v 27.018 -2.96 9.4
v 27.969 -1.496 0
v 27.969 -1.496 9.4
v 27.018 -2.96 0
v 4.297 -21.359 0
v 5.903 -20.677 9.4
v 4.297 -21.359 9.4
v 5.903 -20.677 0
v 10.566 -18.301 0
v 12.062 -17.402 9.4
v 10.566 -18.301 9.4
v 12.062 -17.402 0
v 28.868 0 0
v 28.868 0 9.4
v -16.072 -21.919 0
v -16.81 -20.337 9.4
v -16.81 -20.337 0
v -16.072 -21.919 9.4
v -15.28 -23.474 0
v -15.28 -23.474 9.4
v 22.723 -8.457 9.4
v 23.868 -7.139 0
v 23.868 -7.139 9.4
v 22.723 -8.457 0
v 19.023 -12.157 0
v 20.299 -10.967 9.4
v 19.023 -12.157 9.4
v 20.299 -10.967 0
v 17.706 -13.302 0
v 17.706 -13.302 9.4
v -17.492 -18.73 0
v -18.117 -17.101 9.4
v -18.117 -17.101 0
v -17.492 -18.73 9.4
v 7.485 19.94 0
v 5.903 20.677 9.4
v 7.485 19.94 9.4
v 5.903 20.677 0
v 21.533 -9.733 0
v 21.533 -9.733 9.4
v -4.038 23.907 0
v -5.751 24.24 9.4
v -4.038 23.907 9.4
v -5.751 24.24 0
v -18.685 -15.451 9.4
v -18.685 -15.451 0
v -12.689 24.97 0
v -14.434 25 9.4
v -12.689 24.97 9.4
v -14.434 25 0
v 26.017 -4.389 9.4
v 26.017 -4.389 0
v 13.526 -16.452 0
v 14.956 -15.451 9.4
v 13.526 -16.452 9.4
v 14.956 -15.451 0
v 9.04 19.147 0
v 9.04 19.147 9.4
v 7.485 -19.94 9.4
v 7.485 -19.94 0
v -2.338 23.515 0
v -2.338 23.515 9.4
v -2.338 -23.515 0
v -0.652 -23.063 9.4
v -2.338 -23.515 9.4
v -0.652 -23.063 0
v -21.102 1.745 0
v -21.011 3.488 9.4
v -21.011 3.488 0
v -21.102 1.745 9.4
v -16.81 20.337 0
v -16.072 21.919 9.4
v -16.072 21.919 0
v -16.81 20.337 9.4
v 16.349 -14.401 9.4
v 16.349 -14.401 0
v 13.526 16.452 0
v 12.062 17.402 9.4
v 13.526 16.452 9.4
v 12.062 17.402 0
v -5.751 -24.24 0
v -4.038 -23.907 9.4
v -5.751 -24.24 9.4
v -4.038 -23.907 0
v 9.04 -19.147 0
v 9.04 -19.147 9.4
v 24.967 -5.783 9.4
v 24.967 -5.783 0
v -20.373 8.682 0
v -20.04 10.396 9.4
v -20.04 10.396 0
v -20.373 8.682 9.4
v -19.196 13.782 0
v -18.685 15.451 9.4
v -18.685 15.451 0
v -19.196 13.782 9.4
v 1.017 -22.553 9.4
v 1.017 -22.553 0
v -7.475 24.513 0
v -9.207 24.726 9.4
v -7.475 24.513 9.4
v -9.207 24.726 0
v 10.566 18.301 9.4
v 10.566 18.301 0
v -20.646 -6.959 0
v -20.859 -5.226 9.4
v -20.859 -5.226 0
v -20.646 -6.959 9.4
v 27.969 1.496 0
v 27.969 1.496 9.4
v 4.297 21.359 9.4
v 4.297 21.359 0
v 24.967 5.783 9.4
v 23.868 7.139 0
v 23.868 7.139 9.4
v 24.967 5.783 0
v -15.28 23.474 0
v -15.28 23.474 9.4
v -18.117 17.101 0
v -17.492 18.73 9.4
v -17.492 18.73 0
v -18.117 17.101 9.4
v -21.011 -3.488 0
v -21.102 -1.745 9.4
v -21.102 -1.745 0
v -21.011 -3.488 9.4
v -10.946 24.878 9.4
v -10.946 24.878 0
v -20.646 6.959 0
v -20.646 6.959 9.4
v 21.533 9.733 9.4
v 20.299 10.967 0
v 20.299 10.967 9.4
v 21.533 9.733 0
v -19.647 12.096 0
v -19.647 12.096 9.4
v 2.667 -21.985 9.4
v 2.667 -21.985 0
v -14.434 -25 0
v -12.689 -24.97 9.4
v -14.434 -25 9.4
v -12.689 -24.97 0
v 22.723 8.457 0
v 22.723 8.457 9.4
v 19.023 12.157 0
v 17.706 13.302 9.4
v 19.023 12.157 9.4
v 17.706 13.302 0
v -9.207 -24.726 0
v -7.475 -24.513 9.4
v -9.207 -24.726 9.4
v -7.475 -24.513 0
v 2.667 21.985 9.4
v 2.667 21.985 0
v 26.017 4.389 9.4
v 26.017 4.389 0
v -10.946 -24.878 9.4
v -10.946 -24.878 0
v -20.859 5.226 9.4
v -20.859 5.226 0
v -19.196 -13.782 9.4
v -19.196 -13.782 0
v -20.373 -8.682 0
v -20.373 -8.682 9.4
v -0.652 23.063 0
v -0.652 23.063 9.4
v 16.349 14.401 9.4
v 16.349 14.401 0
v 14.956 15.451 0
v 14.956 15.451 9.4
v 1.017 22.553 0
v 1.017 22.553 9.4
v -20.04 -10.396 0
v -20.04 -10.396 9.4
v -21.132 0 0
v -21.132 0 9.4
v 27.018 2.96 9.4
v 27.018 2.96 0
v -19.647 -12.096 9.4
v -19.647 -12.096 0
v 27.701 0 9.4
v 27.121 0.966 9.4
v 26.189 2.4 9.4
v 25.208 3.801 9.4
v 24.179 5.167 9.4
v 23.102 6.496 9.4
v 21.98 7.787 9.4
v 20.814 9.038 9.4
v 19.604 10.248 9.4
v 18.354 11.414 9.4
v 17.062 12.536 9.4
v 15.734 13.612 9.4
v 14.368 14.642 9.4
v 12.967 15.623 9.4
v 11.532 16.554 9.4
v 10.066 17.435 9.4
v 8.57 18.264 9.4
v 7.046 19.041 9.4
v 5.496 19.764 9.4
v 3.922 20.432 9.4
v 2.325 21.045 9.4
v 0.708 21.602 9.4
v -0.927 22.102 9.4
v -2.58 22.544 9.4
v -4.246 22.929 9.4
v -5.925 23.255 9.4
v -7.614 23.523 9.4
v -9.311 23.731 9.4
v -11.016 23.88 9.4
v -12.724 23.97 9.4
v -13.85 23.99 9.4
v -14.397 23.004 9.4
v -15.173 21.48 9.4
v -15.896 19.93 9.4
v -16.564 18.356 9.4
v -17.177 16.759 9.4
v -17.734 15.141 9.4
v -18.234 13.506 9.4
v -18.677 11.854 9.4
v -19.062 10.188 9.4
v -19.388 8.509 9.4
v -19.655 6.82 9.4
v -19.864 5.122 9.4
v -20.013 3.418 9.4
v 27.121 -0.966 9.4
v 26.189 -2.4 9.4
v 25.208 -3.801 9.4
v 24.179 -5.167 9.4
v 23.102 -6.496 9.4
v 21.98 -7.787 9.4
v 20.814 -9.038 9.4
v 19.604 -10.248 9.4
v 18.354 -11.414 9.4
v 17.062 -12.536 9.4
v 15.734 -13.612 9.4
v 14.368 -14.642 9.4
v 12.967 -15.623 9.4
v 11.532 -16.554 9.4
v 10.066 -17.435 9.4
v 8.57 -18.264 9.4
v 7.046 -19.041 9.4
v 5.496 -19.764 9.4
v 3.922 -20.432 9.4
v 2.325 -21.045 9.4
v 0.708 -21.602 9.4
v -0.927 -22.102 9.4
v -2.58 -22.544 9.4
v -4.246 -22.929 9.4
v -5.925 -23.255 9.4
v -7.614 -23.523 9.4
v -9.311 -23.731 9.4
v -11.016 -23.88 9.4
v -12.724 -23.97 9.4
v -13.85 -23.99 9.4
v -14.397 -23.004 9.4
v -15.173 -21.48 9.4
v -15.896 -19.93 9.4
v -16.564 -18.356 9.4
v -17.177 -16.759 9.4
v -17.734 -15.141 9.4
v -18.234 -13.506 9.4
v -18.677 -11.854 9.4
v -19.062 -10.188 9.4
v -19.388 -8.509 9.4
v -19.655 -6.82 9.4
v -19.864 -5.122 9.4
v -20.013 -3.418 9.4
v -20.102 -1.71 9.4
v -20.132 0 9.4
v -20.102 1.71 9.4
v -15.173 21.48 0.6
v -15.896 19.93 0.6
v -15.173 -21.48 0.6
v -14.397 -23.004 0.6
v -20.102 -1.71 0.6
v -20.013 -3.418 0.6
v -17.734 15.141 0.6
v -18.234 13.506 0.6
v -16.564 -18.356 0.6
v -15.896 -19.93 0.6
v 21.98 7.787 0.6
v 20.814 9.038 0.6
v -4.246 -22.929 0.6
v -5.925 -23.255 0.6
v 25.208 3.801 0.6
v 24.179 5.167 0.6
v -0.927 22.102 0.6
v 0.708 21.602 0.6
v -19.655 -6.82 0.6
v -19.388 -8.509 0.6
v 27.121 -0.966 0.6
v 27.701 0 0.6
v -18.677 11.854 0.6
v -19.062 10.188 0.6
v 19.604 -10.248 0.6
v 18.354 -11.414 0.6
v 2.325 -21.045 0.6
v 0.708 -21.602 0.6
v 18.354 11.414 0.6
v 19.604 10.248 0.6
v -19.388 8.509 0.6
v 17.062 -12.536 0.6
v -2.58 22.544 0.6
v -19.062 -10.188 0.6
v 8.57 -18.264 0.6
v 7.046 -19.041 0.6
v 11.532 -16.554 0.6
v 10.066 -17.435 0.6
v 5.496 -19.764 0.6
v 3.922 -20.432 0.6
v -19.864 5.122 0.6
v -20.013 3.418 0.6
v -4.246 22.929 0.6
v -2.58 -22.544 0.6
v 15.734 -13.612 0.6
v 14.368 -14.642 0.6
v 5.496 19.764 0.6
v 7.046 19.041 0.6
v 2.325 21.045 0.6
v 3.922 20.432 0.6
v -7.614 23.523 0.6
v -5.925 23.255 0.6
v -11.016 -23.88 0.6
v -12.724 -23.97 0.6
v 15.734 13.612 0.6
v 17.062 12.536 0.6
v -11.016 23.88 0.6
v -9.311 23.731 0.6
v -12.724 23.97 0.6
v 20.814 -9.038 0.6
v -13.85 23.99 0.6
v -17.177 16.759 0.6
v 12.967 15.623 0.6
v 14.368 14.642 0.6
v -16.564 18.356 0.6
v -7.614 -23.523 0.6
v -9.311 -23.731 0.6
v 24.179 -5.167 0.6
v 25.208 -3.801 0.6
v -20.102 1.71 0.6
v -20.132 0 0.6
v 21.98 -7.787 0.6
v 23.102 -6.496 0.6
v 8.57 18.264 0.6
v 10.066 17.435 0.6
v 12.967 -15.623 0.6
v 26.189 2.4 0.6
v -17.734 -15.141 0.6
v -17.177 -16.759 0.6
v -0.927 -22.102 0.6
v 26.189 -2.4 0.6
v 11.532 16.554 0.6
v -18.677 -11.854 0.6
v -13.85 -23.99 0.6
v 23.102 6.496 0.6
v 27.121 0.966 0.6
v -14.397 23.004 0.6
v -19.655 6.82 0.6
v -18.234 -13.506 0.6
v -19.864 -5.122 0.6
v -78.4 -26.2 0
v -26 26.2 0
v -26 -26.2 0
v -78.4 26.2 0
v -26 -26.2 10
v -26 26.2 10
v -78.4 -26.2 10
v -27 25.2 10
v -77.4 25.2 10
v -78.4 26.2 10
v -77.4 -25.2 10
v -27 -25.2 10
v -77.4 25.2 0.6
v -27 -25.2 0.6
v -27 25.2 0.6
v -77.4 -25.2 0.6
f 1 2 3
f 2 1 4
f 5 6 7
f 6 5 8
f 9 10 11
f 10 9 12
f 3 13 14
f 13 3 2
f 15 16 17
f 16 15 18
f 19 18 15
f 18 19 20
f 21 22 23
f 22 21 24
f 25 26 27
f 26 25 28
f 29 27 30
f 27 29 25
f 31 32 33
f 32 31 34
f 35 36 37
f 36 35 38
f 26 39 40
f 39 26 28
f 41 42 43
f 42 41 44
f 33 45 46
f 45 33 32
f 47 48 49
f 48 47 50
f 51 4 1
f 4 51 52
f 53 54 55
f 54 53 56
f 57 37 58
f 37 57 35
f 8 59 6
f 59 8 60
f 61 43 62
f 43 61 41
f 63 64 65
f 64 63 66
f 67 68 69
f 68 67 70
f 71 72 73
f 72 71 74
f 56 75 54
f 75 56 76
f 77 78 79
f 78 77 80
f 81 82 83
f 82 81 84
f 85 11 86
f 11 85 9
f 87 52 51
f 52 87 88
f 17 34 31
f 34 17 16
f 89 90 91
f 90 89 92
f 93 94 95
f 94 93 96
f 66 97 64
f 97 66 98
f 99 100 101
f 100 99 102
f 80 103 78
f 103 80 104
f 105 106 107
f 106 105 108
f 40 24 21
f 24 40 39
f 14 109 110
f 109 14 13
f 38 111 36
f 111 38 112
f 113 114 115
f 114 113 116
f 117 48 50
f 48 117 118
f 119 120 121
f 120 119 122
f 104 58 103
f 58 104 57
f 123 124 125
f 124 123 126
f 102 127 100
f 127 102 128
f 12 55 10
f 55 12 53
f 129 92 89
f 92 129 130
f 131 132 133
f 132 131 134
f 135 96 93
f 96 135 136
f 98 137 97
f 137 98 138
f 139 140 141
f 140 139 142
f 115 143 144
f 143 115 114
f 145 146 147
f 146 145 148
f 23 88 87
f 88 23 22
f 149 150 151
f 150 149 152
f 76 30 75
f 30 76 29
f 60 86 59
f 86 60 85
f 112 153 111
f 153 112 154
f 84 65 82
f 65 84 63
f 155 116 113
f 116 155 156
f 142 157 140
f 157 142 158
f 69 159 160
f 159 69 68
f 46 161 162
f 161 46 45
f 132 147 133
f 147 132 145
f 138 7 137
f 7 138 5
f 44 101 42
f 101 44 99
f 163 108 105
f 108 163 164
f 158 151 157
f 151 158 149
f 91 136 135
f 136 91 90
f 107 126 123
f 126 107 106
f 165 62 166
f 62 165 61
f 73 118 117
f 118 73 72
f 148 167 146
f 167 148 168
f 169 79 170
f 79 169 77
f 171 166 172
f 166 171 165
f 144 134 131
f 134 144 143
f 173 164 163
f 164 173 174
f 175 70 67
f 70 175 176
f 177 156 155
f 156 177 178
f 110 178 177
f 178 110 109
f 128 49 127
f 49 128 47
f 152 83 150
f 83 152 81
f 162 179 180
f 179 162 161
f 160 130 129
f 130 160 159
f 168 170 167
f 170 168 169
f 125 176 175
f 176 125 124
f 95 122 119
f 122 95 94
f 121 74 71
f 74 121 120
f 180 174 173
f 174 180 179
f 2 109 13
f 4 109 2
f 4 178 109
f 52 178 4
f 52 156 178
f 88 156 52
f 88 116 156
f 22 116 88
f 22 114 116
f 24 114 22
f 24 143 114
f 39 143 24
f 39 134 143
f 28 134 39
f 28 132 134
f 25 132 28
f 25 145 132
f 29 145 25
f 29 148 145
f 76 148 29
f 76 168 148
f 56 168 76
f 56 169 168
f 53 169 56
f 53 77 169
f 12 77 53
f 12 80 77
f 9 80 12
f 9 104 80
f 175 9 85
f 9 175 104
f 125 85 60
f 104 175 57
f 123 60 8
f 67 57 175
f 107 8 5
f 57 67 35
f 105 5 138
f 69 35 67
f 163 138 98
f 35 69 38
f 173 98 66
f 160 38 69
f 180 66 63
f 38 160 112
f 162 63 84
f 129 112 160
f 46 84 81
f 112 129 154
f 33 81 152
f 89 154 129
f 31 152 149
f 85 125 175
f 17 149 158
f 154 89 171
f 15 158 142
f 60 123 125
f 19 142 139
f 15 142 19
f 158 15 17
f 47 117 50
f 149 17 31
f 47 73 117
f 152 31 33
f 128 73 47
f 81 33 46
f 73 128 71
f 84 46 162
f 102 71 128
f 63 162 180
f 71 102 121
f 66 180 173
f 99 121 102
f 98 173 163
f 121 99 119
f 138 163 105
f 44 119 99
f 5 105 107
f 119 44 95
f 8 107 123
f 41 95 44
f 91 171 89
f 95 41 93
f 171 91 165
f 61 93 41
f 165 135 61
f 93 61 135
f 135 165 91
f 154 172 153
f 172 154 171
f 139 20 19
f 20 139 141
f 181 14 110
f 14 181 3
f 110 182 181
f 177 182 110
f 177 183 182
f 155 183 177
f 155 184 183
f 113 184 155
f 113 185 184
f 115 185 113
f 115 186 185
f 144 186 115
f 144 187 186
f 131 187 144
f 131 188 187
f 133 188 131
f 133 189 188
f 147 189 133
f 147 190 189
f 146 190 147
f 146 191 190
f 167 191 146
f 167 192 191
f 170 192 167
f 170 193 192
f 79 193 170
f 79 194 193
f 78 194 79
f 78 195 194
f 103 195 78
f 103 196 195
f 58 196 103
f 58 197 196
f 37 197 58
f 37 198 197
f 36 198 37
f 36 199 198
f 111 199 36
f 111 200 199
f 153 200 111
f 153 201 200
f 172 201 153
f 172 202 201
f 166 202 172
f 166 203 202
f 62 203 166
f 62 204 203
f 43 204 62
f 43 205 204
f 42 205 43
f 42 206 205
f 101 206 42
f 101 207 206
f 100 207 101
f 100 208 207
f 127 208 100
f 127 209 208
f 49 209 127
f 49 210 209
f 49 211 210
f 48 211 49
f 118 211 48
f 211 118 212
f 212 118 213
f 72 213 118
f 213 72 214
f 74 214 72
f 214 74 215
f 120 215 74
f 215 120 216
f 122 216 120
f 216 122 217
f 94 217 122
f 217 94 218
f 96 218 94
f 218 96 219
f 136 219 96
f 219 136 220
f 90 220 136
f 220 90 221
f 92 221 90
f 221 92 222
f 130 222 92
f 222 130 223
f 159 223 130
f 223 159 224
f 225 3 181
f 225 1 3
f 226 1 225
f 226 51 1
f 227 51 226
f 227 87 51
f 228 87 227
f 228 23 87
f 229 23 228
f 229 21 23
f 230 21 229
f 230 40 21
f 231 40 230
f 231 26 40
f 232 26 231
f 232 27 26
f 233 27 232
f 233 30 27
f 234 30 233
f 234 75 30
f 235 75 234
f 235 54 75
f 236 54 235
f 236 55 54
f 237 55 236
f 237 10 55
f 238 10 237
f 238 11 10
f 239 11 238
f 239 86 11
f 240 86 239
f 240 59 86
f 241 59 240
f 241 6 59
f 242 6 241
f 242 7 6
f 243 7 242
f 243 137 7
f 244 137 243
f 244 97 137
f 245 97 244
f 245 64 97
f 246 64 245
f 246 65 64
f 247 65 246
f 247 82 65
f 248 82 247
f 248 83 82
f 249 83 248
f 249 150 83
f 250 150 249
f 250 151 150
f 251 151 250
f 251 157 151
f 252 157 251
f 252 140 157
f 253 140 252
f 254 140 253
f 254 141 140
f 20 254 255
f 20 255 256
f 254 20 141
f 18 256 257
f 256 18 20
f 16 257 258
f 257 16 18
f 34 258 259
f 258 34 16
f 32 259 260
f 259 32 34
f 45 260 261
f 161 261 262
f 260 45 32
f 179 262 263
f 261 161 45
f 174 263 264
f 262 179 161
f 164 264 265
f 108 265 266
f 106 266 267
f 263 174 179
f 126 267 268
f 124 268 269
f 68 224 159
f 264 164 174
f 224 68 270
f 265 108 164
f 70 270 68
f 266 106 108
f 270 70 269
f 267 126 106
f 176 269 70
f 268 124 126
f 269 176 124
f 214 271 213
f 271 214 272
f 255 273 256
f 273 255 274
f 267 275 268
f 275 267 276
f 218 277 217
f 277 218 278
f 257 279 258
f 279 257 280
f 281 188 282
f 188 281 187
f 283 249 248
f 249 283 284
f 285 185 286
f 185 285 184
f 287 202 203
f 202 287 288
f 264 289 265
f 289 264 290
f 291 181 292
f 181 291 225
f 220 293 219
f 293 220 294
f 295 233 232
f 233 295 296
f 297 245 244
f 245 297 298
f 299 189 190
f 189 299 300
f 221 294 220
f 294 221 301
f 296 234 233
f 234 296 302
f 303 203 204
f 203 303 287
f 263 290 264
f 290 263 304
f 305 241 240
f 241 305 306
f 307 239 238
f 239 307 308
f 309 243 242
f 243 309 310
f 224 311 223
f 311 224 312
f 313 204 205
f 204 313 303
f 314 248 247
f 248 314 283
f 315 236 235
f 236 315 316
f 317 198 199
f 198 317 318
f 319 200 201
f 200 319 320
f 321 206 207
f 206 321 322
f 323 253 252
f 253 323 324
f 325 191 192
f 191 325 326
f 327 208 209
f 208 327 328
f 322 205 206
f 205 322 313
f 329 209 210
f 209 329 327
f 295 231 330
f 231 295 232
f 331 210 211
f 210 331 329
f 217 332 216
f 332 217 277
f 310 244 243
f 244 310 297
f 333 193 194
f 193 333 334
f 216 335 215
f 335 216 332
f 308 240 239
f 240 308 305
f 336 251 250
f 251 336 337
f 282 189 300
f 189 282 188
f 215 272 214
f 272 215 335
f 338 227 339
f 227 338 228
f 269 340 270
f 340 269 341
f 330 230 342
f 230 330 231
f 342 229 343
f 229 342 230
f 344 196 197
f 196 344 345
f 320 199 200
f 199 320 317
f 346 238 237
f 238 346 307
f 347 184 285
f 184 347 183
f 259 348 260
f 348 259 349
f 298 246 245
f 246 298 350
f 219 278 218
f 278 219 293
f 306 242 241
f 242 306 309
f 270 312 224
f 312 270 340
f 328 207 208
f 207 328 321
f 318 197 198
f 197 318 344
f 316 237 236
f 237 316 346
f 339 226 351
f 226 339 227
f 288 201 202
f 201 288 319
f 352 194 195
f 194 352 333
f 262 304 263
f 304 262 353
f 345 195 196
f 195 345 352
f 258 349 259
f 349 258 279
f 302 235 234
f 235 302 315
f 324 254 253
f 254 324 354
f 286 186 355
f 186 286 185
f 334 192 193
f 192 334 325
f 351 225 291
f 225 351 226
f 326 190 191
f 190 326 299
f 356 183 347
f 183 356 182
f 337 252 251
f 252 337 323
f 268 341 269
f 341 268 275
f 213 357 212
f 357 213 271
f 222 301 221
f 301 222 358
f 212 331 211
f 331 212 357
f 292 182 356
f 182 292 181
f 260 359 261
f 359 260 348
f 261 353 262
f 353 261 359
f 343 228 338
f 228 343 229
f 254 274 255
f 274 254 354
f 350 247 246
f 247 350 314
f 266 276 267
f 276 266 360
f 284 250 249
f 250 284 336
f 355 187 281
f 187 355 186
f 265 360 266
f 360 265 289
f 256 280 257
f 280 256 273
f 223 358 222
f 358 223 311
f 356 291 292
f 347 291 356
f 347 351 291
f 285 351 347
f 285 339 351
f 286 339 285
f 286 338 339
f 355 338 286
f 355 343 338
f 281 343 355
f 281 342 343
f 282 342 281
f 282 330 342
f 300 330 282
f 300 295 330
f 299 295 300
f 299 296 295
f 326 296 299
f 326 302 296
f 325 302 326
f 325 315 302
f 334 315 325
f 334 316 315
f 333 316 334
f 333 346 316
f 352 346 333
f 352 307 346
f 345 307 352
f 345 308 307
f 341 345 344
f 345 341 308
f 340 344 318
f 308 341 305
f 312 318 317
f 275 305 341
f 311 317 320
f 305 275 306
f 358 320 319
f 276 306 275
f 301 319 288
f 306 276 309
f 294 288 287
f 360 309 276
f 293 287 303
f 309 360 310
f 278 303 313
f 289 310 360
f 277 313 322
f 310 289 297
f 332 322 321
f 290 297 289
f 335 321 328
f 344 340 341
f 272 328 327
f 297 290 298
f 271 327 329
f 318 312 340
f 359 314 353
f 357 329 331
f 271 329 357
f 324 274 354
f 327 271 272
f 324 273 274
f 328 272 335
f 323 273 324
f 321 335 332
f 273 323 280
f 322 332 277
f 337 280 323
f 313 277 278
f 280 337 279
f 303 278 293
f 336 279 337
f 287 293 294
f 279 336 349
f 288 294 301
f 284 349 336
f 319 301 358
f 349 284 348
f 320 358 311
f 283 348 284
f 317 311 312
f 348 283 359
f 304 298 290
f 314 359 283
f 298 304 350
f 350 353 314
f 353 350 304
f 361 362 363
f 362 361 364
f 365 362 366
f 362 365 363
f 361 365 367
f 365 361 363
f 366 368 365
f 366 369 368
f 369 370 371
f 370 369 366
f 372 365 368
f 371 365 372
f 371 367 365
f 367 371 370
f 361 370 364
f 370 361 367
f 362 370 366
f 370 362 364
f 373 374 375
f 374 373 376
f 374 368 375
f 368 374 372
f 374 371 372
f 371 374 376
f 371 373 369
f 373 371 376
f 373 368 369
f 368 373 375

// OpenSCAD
// File reuleaux-n-gon.scad
// Prints out a Reuleaux n-gon and an enclosure for it to roll in
// (c) 2020 Rich Cameron
// Released under a CC-BY 4.0 International License

width = 50; // width of the object, in mm
sides = 3; // must be an odd number (>=3) 
height = 10; // height in z direction 
wall = 1; // thickness of vertical walls
base = .6; // thickness of solid base
clearance = .2; // clearance between n-gon and enclosure

$fs = .2;
$fa = 2;

if((sides % 2) != 1 || sides < 3) {
	echo("Reuleaux polygons must have an odd number of sides.");
} else {
	difference() {
		linear_extrude(height - base) intersection_for(a = [0:360 / sides:359]) rotate(a) translate([width / (sin(180 / sides) / sin(90 / sides)), 0, 0]) circle(width);
		translate([0, 0, base]) linear_extrude(height) offset(-wall) intersection_for(a = [0:360 / sides:359]) rotate(a) translate([width / (sin(180 / sides) / sin(90 / sides)), 0, 0]) circle(width);
	}
	
	translate([-width - wall * 2 - clearance, 0, 0]) difference() {
		linear_extrude(height) rotate(180 / (sides + 1)) circle((width / 2 + wall + clearance) / cos(180 / (sides + 1)), $fn = sides + 1);
		translate([0, 0, base]) linear_extrude(height) offset(-wall) rotate(180 / (sides + 1)) circle((width / 2 + wall + clearance) / cos(180 / (sides + 1)), $fn = sides + 1);
	}
	
	
	%circle(r = width / (sin(180 / sides) / sin(90 / sides)), $fn = sides);
}
